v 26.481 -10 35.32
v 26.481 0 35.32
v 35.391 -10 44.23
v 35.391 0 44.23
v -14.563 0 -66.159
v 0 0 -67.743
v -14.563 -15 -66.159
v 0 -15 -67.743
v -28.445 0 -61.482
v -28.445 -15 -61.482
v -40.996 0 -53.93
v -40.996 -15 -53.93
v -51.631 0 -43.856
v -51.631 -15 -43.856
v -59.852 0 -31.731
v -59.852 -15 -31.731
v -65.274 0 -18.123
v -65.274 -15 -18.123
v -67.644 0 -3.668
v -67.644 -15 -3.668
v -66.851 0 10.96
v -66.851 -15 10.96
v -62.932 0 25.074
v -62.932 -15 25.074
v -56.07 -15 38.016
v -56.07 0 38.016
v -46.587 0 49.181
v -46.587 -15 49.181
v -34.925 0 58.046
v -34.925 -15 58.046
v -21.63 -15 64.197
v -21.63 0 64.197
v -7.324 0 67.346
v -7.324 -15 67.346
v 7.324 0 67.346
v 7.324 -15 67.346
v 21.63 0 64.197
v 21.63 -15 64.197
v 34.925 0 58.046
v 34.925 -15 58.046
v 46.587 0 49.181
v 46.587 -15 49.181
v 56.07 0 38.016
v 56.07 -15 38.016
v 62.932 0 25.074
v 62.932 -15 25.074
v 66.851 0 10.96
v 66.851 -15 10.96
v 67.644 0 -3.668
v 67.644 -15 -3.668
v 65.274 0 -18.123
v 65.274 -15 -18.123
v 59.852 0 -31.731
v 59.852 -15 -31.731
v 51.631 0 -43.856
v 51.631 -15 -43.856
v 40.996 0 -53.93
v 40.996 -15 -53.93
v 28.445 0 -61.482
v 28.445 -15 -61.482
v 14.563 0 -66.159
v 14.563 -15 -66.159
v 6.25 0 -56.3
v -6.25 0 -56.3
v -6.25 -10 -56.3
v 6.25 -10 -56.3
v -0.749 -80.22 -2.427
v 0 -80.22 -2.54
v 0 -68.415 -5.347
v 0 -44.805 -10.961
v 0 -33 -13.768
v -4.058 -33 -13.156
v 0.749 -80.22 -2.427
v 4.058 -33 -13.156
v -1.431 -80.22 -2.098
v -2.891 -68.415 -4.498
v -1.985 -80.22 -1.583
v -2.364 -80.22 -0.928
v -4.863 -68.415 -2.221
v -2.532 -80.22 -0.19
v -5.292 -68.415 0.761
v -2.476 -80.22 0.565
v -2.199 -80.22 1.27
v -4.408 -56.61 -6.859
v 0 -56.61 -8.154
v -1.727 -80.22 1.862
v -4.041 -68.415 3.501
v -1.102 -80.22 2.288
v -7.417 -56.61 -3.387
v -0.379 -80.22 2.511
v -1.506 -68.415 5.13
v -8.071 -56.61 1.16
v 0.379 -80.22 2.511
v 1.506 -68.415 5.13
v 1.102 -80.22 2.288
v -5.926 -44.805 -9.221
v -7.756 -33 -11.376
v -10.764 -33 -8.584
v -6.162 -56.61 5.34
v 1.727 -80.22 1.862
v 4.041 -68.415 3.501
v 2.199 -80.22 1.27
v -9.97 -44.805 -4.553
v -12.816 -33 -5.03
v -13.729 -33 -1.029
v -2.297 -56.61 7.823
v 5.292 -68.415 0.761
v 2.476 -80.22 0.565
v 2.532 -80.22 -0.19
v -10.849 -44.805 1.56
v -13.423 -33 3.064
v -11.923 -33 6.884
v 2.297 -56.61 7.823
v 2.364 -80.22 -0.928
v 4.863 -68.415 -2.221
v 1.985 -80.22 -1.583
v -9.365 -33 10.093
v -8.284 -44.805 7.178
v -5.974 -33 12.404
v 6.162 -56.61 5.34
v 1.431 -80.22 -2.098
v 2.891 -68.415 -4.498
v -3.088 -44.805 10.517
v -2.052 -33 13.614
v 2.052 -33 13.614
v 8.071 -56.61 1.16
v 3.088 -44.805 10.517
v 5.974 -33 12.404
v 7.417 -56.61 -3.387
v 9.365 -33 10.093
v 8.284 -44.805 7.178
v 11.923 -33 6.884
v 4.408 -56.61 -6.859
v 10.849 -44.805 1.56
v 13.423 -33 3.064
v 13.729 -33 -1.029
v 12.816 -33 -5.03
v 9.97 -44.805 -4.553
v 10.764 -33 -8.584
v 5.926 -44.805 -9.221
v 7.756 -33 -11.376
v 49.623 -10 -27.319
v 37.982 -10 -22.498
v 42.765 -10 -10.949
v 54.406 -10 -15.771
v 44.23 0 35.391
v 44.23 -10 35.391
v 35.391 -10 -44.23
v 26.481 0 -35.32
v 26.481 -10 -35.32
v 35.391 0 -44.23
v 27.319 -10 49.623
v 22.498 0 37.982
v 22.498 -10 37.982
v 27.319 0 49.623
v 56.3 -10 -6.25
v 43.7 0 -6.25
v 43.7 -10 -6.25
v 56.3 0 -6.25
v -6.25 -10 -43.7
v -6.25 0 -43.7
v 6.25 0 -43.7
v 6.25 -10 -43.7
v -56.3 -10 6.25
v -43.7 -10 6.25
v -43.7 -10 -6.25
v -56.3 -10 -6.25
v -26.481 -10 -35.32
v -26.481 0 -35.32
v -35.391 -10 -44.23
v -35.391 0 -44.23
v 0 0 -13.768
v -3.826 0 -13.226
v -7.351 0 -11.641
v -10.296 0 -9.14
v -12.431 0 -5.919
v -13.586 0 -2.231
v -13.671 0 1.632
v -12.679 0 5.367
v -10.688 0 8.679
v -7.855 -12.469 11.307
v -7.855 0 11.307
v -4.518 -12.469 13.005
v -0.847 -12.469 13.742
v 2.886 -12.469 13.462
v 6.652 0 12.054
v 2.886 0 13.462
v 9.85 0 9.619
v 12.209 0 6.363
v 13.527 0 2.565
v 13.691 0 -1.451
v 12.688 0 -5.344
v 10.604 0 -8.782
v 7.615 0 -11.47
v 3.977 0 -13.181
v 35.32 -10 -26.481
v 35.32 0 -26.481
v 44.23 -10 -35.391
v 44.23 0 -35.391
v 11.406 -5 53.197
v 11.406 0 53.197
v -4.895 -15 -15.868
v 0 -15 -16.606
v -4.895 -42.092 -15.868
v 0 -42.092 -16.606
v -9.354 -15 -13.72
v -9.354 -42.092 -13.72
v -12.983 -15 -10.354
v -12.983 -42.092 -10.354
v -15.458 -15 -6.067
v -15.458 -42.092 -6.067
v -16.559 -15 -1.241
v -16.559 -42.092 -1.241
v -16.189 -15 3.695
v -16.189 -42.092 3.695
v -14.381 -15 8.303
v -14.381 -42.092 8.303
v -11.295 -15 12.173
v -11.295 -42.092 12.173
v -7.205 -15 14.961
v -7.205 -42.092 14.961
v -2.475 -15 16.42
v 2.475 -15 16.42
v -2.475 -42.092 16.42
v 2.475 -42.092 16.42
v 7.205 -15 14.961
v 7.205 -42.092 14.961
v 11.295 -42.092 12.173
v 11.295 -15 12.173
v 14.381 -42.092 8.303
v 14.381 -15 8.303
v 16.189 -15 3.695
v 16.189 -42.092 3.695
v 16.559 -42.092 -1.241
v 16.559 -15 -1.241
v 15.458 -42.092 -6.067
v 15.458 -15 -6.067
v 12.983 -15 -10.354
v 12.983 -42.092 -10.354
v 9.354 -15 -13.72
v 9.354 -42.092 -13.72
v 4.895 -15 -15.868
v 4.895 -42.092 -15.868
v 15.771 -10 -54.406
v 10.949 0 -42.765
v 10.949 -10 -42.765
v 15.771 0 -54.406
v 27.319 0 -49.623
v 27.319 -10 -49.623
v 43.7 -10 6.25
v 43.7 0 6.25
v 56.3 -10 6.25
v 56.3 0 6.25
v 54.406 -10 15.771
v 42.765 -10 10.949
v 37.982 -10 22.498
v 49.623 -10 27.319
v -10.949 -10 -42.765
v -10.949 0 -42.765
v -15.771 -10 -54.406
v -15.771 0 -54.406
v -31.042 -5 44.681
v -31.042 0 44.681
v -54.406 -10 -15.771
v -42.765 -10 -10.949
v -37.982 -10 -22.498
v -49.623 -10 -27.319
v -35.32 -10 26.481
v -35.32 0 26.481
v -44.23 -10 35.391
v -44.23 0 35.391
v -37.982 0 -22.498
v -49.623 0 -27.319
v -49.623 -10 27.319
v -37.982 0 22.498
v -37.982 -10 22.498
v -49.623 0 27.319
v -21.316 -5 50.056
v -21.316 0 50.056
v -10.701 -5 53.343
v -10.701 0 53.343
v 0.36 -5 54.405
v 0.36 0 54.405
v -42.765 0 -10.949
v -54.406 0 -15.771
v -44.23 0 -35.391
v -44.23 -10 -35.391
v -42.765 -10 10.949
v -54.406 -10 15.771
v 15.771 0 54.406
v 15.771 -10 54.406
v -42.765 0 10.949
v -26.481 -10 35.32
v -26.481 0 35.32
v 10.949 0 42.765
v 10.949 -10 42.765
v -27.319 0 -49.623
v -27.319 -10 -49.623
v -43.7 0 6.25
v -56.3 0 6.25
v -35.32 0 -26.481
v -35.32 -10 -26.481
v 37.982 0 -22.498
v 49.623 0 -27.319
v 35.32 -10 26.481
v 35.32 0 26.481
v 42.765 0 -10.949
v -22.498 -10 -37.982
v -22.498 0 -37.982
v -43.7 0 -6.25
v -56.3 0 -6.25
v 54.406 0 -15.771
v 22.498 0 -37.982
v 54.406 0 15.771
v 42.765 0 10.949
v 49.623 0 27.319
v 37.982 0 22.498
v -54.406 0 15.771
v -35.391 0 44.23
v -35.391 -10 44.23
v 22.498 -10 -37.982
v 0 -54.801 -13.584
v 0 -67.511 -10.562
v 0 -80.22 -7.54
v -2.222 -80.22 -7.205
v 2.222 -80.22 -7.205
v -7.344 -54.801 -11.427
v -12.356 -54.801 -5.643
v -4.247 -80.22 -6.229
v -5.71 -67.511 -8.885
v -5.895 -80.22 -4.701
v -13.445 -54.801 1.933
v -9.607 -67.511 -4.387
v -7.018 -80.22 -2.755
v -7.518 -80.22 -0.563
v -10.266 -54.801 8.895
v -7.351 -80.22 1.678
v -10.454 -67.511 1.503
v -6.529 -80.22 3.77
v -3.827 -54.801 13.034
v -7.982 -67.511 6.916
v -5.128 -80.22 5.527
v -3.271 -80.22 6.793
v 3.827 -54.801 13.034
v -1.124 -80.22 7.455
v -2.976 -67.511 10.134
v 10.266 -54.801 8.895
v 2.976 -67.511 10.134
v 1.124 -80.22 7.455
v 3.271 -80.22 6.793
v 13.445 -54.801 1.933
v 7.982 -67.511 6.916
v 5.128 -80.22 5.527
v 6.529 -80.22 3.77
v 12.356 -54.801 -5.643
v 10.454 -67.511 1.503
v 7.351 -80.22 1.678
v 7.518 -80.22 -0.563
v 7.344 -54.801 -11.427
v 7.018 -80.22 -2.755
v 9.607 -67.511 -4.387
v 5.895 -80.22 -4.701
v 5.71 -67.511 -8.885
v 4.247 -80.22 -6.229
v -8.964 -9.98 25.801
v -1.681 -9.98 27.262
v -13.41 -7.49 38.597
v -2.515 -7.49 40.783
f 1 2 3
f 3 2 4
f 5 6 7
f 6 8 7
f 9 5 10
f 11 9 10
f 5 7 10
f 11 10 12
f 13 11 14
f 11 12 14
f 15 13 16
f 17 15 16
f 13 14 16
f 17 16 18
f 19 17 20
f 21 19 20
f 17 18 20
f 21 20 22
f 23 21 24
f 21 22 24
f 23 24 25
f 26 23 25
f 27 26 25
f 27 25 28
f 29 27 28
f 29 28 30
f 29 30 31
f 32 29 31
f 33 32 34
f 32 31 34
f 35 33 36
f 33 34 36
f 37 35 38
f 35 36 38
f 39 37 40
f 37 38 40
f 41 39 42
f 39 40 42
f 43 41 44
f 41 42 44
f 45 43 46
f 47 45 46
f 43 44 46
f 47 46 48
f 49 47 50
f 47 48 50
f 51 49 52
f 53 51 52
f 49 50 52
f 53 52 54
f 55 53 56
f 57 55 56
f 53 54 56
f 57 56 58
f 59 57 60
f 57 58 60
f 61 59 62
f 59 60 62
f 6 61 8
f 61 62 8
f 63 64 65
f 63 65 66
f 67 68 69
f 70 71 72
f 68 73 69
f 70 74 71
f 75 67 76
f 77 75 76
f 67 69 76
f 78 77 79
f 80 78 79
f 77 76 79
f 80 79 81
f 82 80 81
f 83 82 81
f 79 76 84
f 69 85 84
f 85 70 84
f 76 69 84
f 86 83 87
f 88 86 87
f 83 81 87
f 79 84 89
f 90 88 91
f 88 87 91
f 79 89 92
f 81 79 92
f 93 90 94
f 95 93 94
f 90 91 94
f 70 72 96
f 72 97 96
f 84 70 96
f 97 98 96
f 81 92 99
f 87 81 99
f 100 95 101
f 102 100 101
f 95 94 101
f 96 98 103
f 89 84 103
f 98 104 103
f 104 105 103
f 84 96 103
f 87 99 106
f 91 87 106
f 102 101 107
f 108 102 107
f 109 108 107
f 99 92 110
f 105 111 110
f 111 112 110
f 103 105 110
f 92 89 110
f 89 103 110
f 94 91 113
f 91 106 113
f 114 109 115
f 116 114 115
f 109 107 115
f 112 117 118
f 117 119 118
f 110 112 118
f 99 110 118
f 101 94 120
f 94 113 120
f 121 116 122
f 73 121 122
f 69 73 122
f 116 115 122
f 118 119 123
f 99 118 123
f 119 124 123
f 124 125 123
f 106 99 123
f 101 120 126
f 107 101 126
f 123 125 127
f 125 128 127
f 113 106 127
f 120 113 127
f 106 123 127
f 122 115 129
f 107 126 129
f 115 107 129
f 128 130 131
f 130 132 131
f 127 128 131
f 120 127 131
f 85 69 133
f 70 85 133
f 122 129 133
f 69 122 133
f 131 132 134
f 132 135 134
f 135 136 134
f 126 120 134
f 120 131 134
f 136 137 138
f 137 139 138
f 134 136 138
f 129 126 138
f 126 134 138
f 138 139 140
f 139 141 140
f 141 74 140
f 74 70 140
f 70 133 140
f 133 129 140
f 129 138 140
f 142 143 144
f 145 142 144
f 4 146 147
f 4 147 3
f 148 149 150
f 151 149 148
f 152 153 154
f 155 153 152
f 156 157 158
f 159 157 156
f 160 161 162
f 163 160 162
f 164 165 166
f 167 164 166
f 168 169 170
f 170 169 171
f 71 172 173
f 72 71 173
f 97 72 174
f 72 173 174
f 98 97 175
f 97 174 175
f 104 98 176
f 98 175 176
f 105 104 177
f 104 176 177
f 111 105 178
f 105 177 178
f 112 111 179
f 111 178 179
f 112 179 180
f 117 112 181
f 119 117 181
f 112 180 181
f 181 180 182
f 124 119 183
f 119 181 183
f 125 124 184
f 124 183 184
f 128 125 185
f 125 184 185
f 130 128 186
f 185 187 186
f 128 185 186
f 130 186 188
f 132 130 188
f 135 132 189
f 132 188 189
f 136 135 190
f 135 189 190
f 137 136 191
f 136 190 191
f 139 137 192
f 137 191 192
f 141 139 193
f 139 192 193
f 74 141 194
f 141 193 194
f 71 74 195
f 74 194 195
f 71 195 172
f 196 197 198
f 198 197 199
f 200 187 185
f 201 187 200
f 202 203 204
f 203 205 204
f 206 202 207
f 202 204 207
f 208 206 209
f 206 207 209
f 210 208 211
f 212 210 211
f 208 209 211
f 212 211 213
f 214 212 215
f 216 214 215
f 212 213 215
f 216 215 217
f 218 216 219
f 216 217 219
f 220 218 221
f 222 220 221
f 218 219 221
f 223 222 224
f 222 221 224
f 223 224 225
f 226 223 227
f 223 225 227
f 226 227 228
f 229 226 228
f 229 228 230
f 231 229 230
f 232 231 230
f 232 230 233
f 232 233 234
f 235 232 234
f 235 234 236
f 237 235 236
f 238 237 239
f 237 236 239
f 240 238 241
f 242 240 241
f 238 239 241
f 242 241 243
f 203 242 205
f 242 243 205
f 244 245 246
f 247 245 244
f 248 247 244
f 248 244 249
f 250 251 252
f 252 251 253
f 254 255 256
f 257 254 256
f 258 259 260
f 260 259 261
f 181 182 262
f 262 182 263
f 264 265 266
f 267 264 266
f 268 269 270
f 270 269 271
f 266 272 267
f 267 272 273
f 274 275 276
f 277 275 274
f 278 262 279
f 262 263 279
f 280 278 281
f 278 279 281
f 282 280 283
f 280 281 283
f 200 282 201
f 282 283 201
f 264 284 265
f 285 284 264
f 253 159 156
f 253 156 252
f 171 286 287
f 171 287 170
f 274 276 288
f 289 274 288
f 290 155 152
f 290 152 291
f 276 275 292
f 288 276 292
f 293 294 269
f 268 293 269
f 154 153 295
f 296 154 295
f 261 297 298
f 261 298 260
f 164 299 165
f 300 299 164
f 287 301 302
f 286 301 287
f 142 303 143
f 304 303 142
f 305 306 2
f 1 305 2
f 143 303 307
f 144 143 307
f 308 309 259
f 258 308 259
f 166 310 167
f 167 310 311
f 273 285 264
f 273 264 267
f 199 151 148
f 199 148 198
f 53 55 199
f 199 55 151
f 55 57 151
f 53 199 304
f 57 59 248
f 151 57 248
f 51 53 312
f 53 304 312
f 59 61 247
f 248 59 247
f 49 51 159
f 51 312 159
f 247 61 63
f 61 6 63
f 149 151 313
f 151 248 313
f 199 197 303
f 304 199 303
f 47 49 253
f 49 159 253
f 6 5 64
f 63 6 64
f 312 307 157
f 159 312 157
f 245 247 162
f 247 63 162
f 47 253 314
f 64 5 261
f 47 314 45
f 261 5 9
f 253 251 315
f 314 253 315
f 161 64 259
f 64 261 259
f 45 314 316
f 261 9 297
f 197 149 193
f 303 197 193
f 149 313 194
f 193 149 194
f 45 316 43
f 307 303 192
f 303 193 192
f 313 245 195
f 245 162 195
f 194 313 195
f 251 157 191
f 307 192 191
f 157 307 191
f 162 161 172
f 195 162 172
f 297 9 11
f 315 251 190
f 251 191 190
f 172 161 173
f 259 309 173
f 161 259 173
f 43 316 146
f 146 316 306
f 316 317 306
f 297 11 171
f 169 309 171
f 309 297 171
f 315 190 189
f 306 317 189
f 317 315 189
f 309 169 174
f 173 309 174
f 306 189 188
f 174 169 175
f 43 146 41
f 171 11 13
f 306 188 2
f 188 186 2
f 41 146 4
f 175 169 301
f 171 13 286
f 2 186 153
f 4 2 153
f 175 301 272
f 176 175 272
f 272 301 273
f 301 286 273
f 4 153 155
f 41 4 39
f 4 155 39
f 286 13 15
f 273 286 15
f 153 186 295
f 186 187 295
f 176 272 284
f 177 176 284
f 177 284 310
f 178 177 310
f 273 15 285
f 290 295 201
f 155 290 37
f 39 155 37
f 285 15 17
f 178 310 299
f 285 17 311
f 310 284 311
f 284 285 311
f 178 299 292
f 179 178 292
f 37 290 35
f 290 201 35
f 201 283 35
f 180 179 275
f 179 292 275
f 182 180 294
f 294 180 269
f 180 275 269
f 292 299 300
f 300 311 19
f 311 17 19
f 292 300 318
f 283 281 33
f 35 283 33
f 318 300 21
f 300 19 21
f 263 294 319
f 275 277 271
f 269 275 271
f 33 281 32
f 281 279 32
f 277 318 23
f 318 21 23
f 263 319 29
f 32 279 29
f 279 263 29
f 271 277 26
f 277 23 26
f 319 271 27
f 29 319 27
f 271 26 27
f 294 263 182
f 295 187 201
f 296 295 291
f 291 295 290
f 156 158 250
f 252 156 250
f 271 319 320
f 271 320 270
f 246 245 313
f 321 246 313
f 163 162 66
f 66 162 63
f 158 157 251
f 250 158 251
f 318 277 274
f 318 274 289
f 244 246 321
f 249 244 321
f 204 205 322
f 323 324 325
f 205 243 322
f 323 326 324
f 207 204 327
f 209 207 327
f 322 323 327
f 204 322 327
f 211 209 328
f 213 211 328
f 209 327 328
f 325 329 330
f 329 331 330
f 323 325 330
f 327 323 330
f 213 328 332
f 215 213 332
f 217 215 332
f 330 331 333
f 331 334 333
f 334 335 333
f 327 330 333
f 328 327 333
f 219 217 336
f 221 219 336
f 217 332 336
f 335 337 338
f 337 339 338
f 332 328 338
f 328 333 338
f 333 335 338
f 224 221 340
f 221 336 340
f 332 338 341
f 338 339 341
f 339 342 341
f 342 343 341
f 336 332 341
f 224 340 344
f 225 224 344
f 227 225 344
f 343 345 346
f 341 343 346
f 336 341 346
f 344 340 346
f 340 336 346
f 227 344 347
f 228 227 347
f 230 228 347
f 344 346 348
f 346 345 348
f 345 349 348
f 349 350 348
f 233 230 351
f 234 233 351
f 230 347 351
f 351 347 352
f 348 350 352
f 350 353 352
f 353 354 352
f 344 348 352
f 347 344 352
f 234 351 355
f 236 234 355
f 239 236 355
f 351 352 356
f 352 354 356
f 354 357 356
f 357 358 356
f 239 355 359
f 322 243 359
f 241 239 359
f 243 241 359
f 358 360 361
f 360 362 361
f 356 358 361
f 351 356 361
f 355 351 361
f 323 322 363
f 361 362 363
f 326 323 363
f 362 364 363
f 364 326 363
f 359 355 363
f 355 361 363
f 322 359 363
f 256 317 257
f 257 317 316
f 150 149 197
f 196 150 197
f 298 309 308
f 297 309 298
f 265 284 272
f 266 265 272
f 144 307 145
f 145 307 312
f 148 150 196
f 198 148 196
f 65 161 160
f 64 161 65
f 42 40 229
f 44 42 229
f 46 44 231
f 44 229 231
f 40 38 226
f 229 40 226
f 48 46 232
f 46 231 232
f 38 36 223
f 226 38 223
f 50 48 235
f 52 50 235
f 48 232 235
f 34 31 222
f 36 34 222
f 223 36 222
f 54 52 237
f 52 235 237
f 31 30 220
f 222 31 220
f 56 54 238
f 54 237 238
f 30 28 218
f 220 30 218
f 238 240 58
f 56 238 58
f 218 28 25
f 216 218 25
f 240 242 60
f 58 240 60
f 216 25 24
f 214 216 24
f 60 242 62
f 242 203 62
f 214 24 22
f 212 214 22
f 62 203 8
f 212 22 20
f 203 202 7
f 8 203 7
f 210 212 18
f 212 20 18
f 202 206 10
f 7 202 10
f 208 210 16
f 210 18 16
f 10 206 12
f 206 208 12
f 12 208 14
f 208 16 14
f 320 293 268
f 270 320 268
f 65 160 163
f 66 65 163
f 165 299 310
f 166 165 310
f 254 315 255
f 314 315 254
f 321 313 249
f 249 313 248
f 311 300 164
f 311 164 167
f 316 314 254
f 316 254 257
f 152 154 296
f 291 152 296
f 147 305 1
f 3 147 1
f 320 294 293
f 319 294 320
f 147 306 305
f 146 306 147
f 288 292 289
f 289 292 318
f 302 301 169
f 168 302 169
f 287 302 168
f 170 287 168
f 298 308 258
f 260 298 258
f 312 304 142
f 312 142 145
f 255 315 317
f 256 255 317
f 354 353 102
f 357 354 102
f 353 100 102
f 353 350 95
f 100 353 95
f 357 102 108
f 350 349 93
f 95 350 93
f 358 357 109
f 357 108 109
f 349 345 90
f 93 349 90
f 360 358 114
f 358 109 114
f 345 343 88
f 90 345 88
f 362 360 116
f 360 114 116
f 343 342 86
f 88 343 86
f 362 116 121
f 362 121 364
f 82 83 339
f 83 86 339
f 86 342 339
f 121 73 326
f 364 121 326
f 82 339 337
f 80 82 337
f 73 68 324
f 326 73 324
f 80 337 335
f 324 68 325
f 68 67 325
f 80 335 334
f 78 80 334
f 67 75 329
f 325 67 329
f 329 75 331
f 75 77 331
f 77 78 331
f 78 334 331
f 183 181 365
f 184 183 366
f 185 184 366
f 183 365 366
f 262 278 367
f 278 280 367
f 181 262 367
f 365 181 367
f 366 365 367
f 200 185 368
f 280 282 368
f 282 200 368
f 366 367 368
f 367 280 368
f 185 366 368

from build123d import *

# Parameters (mm, degrees)
SKETCH3_W          = 12.5
SKETCH3_H          = 12.6
CUT_EXTRUDE1_DEPTH = 10
CIRPATTERN1_COUNT  = 16
CUT_SWEEP3_ANGLE   = 46.890766


# Read off the part's stored shape, not the designer's step: Cut-Sweep3
with BuildPart() as part:
    # Sketch1 → Revolve1 (revolve)
    with BuildSketch(Plane(origin=(0, 0, 0), x_dir=(0, 0, -1), z_dir=(1, 0, 0))):
        Polygon((13.767922605, 0), (67.742922605, 0), (67.742922605, -15), (16.605833346, -15), (16.605833346, -42.092408241), (7.539548782, -80.219585538), (2.539548782, -80.219585538), (13.767922605, -33), align=None)
    revolve(axis=Axis((0, 0, 0), (0, 1, 0)))

    # Sketch3 → Cut-Extrude1 (cut)
    with BuildSketch(Plane(origin=(0, 0, 0), x_dir=(1, 0, 0), z_dir=(0, 1, 0))):
        with Locations((0, 50)):
            Rectangle(SKETCH3_W, SKETCH3_H)
    cut_extrude1 = extrude(amount=-CUT_EXTRUDE1_DEPTH, mode=Mode.SUBTRACT)

    # CirPattern1: Cut-Extrude1 ×16 about axis, 2 skipped
    cirpattern1_axis = Axis((0, 0, 0), (0, -1, 0))
    add([cut_extrude1.rotate(cirpattern1_axis, i * 360 / CIRPATTERN1_COUNT) for i in range(1, CIRPATTERN1_COUNT) if i not in (8, 9)], mode=Mode.SUBTRACT)

    # Cut-Sweep3 outline → Cut-Sweep3 (revolve, cut)
    with BuildSketch(Plane(origin=(0, 0, 0), x_dir=(-0.5705578043075069, 0, 0.8212574455941308), z_dir=(-0.8212574455941308, 0, -0.5705578043075069))):
        Polygon((54.406189133, -5), (54.406189133, 0), (13.767922605, 0), (13.767922605, -12.46941978), align=None)
    revolve(axis=Axis((0, 0, 0), (0, 1, 0)), revolution_arc=CUT_SWEEP3_ANGLE, mode=Mode.SUBTRACT)


solid = part.part
